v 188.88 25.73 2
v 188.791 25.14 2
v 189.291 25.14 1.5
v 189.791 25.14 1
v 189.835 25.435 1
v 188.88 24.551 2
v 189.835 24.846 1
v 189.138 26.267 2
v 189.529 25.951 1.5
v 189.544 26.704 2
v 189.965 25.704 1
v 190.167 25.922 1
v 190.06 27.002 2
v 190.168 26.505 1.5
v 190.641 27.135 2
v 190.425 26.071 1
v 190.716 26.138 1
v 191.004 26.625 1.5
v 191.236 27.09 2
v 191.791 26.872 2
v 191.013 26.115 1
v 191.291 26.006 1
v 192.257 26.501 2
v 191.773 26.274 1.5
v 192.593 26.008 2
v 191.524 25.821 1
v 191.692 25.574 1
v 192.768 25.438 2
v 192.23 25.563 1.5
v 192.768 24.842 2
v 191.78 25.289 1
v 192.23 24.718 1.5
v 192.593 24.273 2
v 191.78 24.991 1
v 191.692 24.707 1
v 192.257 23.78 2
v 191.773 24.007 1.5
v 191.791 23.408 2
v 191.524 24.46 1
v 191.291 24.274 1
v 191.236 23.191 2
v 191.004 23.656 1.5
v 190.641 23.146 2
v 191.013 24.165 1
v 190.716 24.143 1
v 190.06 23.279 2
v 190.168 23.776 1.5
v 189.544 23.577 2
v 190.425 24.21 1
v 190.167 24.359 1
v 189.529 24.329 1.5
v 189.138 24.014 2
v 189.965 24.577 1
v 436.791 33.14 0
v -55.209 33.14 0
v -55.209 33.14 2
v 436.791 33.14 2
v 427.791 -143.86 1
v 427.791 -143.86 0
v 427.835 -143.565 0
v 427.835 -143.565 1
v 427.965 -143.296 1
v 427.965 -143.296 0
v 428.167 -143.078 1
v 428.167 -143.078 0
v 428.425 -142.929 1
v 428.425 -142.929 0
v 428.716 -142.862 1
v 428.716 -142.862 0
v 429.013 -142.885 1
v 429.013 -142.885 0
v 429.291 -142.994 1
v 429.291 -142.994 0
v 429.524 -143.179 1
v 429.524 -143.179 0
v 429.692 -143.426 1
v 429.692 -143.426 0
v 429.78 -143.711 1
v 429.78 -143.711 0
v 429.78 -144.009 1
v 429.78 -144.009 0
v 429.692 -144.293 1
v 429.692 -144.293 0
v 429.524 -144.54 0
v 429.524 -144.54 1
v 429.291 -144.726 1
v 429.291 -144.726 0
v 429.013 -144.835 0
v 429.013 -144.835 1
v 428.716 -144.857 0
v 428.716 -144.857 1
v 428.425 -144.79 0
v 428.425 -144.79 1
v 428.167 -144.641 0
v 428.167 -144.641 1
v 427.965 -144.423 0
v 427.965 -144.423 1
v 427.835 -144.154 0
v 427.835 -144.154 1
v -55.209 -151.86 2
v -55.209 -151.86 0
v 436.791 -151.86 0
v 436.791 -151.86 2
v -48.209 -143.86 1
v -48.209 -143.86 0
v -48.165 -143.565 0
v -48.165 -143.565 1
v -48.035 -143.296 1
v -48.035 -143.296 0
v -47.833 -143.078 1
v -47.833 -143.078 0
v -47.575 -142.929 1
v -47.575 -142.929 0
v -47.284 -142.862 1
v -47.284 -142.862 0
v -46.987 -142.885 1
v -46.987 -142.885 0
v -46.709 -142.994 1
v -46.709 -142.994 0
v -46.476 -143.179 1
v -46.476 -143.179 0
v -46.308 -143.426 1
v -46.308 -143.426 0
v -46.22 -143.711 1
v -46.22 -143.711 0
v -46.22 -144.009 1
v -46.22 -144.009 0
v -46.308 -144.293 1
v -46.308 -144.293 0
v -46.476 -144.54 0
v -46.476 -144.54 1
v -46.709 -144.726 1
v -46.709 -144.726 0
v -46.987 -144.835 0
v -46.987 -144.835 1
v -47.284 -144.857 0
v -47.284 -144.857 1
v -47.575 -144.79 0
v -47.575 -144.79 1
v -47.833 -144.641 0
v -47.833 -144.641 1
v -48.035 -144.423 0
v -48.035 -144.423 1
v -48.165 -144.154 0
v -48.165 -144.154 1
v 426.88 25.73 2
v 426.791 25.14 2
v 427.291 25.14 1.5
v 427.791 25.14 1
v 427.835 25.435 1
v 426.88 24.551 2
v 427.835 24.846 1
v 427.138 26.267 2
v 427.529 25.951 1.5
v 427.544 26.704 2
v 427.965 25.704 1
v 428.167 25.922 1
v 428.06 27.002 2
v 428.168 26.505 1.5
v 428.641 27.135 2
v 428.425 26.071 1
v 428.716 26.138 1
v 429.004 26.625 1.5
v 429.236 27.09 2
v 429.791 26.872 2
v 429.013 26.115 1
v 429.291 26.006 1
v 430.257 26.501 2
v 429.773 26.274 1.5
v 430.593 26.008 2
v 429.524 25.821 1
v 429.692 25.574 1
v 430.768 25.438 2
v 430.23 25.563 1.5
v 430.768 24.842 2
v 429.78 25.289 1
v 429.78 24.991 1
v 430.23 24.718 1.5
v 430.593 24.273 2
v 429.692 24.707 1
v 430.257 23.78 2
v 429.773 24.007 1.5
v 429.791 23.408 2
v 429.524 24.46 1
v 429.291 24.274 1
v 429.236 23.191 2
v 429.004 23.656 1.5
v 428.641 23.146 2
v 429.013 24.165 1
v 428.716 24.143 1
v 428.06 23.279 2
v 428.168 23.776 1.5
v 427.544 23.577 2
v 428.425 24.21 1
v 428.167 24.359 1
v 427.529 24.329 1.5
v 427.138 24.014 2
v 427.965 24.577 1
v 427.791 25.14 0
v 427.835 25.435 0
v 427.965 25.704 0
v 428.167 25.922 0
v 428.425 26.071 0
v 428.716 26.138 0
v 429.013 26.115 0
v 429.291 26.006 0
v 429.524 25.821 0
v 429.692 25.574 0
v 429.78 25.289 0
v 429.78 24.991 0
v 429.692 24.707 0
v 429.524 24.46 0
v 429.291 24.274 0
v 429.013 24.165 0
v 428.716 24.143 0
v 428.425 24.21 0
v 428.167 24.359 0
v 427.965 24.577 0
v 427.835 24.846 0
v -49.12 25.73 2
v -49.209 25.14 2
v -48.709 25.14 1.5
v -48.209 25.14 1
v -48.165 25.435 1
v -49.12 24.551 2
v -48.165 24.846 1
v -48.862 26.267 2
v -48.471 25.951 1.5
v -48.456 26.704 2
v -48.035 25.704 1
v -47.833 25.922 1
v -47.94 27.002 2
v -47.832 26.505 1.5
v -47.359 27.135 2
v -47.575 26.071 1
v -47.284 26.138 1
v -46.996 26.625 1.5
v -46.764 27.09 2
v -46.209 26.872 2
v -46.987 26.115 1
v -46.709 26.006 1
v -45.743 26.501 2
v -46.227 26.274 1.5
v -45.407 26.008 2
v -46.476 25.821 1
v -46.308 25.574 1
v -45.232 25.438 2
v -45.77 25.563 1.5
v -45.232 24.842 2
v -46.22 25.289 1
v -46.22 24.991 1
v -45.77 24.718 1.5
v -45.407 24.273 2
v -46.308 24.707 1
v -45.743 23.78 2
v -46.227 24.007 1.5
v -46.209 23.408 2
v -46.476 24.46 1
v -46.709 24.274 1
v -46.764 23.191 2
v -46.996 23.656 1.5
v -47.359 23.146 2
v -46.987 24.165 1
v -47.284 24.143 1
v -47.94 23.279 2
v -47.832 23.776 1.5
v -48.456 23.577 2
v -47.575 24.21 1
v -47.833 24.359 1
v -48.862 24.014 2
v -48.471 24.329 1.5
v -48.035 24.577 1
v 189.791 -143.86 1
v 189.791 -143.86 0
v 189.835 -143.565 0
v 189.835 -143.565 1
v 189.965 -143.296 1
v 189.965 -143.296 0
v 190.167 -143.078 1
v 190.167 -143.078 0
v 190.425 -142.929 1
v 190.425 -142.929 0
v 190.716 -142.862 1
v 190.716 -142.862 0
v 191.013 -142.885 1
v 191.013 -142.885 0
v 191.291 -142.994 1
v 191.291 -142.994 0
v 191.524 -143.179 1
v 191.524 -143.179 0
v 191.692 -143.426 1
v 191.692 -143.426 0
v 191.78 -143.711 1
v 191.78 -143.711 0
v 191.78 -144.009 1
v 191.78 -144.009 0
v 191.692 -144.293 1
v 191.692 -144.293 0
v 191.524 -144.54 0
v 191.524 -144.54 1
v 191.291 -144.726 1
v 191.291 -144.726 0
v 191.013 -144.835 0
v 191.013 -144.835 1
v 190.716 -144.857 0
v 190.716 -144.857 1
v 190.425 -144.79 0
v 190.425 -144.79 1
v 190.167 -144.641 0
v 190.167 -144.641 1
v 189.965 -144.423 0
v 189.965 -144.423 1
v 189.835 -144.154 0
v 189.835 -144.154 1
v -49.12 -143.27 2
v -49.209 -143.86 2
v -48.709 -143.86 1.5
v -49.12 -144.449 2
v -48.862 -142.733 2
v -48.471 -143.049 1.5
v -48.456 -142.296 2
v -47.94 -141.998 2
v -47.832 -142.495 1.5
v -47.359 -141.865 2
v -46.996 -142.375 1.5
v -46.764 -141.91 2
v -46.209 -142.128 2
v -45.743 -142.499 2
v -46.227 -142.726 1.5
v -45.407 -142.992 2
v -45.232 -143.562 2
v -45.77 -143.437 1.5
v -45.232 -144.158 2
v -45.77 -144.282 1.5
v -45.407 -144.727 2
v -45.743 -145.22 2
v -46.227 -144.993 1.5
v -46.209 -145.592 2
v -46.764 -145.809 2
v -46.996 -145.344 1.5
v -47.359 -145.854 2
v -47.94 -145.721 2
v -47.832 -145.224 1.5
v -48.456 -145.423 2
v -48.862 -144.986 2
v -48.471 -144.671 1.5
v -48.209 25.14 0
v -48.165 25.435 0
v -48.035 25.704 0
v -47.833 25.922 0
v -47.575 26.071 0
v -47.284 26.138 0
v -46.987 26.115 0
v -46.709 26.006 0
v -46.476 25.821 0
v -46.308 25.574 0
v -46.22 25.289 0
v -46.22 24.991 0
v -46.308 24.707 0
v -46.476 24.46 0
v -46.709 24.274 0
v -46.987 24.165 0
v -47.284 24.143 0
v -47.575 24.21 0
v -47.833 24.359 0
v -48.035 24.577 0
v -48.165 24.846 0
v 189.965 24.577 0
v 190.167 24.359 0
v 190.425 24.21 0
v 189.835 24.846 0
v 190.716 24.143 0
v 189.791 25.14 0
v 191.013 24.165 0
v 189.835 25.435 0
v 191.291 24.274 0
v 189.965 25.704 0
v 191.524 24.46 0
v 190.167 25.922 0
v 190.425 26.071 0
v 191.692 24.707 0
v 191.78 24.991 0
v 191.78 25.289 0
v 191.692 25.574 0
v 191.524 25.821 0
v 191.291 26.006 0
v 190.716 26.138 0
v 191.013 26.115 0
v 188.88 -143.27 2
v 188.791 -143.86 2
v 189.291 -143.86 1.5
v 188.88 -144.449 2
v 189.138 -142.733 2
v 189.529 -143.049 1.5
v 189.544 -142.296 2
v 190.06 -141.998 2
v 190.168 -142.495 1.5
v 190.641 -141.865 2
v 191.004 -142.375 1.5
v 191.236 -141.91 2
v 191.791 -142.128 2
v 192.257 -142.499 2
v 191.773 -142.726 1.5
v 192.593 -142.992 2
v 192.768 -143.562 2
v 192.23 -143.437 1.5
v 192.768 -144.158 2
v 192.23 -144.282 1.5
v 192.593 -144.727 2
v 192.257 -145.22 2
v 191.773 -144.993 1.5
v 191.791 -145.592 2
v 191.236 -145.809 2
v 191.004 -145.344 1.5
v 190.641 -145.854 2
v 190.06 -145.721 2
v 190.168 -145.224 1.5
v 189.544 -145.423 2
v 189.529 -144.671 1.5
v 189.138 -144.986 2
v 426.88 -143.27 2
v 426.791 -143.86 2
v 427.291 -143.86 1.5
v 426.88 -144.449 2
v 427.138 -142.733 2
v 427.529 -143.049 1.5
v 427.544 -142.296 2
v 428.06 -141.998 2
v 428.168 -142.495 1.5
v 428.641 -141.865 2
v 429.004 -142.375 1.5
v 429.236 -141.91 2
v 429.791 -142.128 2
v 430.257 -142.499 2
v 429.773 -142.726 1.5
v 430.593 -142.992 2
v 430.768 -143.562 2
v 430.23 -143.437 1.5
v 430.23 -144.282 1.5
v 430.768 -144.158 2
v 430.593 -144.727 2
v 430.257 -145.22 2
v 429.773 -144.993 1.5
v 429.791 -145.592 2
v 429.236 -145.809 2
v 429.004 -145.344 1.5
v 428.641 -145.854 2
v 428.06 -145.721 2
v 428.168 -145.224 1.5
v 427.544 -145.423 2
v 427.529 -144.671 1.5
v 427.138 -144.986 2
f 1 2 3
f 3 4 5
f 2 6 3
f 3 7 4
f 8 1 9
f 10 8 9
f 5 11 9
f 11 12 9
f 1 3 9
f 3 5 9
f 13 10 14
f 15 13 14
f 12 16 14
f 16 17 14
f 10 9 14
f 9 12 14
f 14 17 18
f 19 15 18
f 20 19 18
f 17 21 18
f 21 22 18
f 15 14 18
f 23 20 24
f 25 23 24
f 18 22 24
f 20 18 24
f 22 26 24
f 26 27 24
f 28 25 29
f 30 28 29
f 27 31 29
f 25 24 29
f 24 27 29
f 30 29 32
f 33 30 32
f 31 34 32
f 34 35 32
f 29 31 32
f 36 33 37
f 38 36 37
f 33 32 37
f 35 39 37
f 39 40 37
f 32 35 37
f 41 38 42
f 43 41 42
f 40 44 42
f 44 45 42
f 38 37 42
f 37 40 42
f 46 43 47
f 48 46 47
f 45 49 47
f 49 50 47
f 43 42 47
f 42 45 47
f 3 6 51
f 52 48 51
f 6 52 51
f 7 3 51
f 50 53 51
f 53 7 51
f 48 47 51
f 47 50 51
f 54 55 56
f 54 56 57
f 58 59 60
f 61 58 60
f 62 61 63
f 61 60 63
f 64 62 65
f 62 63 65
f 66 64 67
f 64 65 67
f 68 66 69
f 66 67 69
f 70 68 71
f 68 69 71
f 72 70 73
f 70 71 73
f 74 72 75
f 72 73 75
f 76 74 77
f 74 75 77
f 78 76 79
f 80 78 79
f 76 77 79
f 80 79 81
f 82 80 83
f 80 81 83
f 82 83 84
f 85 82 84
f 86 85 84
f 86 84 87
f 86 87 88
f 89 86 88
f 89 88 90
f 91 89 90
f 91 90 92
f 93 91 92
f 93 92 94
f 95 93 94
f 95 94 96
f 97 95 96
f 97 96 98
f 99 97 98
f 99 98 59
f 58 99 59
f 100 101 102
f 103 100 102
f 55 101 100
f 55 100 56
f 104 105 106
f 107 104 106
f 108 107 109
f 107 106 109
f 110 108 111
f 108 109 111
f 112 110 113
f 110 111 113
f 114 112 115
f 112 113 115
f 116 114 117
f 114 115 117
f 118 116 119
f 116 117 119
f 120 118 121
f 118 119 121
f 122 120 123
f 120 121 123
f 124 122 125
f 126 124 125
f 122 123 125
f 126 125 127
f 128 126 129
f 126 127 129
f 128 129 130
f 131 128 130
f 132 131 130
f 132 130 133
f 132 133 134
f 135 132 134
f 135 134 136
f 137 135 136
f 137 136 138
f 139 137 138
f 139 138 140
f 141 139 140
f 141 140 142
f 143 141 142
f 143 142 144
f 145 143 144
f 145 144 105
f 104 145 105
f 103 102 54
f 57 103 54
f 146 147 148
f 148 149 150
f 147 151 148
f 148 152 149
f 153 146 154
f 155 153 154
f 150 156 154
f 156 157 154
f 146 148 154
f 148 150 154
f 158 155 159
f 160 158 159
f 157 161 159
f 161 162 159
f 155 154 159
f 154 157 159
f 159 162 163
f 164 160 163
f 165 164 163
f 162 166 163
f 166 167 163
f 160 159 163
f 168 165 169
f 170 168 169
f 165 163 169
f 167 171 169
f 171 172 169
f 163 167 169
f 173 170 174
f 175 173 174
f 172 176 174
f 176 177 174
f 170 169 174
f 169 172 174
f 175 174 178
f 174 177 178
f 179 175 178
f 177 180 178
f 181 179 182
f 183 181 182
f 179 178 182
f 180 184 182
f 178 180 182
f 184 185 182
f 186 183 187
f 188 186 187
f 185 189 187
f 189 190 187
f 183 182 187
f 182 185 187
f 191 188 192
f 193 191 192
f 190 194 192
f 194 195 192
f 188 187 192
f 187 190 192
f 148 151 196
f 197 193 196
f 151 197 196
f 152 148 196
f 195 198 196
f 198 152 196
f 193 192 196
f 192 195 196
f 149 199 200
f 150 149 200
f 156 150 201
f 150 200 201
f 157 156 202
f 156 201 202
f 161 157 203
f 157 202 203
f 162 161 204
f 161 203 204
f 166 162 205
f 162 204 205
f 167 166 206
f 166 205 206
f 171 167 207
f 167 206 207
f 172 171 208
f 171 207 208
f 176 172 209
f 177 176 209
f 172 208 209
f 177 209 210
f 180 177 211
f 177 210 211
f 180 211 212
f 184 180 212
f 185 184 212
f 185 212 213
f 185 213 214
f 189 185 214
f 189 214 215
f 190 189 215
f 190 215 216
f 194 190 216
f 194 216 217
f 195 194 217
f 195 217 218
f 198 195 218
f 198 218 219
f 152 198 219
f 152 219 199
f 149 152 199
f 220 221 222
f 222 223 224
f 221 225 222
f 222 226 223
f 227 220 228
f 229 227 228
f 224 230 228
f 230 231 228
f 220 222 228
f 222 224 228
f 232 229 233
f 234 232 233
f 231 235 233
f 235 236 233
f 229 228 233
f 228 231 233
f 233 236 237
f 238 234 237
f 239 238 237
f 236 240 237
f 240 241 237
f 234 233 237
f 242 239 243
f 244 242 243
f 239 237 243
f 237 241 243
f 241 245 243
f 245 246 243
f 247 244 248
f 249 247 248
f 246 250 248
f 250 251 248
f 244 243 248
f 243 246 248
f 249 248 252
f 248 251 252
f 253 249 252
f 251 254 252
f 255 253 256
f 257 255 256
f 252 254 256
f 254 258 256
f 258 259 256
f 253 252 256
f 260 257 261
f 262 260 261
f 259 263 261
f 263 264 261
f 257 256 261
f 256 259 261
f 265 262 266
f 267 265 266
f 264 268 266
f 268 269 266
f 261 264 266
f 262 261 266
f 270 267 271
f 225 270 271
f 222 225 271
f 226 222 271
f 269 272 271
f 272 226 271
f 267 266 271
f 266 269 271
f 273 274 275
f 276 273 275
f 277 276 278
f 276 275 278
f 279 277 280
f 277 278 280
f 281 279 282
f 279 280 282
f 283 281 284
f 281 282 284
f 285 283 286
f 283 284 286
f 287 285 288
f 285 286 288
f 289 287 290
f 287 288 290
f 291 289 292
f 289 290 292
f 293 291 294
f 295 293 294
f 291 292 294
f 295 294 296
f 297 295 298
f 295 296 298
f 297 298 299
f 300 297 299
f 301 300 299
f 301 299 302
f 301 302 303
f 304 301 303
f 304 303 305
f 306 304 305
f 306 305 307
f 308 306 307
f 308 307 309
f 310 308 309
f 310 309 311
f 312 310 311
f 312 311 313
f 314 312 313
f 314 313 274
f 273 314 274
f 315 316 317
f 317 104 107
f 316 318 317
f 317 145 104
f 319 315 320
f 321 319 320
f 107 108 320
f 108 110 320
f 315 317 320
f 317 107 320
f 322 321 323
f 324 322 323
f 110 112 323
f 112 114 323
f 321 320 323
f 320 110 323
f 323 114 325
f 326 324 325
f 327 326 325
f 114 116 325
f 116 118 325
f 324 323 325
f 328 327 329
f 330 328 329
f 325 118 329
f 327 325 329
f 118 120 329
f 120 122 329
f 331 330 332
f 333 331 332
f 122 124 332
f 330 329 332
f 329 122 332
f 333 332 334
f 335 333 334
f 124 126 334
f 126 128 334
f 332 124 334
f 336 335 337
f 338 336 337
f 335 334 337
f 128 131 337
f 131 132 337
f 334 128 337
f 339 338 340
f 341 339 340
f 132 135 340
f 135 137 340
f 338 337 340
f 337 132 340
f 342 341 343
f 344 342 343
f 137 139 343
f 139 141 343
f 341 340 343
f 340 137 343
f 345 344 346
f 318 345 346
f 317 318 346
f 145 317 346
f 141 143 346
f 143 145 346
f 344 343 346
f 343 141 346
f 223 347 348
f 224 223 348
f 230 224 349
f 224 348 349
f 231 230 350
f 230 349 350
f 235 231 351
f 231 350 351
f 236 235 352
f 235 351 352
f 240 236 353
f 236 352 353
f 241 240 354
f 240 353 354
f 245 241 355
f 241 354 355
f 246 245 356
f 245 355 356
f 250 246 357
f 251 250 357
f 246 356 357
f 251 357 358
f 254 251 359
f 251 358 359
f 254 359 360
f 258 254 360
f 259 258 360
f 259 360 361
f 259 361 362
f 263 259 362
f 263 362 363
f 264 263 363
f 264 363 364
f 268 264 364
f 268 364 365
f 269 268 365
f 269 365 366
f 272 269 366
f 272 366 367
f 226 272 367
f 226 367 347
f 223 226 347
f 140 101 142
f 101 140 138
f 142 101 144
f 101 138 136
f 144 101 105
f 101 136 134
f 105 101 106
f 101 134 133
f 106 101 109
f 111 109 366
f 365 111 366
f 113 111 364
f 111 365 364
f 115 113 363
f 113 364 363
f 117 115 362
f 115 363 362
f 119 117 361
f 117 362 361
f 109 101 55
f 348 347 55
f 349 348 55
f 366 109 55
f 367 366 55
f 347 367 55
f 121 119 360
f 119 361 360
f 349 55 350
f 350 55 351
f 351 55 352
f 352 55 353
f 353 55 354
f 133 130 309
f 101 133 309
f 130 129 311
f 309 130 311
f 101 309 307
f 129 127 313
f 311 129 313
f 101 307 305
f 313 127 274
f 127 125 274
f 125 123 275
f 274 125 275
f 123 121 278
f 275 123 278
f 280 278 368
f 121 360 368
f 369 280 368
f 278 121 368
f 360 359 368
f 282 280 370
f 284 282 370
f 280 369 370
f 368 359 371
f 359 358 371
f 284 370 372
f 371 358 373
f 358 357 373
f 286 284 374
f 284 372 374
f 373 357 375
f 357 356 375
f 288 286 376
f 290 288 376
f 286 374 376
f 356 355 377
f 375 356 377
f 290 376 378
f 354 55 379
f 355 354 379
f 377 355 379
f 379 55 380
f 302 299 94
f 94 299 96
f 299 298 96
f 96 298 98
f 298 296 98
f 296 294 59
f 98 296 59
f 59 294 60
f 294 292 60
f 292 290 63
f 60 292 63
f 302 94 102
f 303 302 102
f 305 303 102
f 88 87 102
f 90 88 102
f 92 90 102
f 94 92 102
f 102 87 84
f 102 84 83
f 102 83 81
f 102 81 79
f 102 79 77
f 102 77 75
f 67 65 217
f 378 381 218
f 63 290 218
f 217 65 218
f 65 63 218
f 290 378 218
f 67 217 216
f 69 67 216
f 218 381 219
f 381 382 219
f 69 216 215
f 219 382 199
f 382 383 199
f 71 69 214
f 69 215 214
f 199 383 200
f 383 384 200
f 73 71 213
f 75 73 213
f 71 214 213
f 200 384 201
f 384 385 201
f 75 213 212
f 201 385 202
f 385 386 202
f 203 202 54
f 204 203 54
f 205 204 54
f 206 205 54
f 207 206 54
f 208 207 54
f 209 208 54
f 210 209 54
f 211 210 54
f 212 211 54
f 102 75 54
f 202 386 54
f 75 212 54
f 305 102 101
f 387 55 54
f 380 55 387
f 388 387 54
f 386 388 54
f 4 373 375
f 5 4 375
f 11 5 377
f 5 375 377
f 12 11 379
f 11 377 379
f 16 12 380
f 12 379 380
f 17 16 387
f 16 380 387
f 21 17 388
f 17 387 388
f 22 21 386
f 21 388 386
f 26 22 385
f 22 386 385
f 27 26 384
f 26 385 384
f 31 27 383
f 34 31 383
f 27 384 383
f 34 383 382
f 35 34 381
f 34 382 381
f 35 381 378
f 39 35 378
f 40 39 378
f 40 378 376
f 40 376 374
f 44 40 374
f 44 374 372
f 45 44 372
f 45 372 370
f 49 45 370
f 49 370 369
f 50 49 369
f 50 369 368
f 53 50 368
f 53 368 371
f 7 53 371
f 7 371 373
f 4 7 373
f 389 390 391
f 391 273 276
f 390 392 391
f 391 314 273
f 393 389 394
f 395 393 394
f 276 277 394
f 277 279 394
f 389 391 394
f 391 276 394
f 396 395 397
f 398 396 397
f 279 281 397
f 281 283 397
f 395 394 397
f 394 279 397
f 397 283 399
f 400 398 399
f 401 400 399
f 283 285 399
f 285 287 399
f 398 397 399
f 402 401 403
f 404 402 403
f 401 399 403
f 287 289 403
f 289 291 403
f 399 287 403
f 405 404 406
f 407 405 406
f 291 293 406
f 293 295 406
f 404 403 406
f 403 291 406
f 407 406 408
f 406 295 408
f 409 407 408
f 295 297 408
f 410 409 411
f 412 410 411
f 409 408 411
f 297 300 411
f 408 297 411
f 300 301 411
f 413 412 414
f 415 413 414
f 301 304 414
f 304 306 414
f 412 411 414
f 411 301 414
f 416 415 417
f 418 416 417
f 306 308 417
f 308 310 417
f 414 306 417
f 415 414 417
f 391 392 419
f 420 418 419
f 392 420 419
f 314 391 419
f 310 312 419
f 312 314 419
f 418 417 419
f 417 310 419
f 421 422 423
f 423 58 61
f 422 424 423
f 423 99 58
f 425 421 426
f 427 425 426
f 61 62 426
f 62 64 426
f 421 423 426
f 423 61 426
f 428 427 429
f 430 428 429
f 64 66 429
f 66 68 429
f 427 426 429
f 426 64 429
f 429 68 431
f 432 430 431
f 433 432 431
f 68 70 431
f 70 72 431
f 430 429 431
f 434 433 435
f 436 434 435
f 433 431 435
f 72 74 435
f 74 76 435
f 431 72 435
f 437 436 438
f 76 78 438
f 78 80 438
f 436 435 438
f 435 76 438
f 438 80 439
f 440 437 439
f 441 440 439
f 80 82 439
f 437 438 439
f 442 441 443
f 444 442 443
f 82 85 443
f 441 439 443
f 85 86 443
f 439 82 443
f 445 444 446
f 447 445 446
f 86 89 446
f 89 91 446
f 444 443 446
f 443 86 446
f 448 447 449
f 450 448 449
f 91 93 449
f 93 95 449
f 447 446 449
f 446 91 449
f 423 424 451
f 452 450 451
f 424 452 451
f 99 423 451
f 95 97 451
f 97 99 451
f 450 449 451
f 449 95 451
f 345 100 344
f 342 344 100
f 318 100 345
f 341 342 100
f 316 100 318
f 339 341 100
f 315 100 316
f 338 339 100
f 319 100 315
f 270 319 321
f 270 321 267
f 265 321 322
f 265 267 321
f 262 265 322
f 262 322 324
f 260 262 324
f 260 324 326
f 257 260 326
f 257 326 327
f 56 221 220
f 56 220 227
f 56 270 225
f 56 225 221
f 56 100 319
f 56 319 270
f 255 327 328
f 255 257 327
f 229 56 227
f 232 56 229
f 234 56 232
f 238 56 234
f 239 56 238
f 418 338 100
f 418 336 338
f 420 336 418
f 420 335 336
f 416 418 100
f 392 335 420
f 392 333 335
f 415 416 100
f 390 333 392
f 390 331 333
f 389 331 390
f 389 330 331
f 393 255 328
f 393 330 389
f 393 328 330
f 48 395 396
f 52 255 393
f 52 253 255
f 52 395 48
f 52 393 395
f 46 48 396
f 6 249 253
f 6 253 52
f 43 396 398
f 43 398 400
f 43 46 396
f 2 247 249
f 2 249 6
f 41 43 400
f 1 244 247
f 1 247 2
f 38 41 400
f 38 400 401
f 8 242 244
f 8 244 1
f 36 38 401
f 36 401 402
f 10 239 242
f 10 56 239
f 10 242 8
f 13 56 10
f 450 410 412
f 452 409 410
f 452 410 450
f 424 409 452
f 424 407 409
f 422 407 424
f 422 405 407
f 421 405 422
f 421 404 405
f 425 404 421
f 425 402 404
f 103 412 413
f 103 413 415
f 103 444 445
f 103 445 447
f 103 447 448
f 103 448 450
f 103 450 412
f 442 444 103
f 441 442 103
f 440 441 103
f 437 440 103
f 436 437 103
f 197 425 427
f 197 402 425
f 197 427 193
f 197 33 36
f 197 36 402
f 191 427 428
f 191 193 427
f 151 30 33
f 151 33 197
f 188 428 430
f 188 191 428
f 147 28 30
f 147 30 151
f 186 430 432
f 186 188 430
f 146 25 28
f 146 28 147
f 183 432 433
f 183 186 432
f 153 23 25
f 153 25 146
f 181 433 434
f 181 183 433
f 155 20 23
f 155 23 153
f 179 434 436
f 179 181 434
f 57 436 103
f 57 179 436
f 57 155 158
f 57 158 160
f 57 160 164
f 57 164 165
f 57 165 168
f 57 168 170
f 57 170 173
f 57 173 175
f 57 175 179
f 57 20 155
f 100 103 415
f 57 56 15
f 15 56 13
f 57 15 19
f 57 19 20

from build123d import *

# Parameters (mm, degrees)
ESQUISSE1_W             = 492
ESQUISSE1_H             = 185
BOSS_EXTRU_1_DEPTH      = 2
ESQUISSE2_R             = 1
ENL_V_MAT_EXTRU_1_DEPTH = 463.44085993
CHANFREIN1_SIZE         = 1


with BuildPart() as part:
    # Esquisse1 → Boss.-Extru.1 (new body)
    with BuildSketch(Plane.XY):
        with Locations((190.790811191, -59.359593679)):
            Rectangle(ESQUISSE1_W, ESQUISSE1_H)
    extrude(amount=BOSS_EXTRU_1_DEPTH)

    # Esquisse2 → Enlèv. mat.-Extru.1 (cut, through all)
    with BuildSketch(Plane(origin=(0, 0, 0), x_dir=(-1, 0, 0), z_dir=(0, 0, -1))):
        with Locations((47.209188809, 25.140406321)):
            Circle(ESQUISSE2_R)
        with Locations((-190.790811191, 25.140406321)):
            Circle(ESQUISSE2_R)
        with Locations((-428.790811191, 25.140406321)):
            Circle(ESQUISSE2_R)
        with Locations((47.209188809, -143.859593679)):
            Circle(ESQUISSE2_R)
        with Locations((-190.790811191, -143.859593679)):
            Circle(ESQUISSE2_R)
        with Locations((-428.790811191, -143.859593679)):
            Circle(ESQUISSE2_R)
    extrude(amount=-ENL_V_MAT_EXTRU_1_DEPTH, mode=Mode.SUBTRACT)

    # Chanfrein1
    chanfrein1_edges = [part.edges().sort_by_distance(p)[0] for p in [
        (-46.209188809, 25.140406321, 2),
        (191.790811191, 25.140406321, 2),
        (429.790811191, 25.140406321, 2),
        (-46.209188809, -143.859593679, 2),
        (191.790811191, -143.859593679, 2),
        (429.790811191, -143.859593679, 2),
    ]]
    chamfer(chanfrein1_edges, length=CHANFREIN1_SIZE)


solid = part.part
